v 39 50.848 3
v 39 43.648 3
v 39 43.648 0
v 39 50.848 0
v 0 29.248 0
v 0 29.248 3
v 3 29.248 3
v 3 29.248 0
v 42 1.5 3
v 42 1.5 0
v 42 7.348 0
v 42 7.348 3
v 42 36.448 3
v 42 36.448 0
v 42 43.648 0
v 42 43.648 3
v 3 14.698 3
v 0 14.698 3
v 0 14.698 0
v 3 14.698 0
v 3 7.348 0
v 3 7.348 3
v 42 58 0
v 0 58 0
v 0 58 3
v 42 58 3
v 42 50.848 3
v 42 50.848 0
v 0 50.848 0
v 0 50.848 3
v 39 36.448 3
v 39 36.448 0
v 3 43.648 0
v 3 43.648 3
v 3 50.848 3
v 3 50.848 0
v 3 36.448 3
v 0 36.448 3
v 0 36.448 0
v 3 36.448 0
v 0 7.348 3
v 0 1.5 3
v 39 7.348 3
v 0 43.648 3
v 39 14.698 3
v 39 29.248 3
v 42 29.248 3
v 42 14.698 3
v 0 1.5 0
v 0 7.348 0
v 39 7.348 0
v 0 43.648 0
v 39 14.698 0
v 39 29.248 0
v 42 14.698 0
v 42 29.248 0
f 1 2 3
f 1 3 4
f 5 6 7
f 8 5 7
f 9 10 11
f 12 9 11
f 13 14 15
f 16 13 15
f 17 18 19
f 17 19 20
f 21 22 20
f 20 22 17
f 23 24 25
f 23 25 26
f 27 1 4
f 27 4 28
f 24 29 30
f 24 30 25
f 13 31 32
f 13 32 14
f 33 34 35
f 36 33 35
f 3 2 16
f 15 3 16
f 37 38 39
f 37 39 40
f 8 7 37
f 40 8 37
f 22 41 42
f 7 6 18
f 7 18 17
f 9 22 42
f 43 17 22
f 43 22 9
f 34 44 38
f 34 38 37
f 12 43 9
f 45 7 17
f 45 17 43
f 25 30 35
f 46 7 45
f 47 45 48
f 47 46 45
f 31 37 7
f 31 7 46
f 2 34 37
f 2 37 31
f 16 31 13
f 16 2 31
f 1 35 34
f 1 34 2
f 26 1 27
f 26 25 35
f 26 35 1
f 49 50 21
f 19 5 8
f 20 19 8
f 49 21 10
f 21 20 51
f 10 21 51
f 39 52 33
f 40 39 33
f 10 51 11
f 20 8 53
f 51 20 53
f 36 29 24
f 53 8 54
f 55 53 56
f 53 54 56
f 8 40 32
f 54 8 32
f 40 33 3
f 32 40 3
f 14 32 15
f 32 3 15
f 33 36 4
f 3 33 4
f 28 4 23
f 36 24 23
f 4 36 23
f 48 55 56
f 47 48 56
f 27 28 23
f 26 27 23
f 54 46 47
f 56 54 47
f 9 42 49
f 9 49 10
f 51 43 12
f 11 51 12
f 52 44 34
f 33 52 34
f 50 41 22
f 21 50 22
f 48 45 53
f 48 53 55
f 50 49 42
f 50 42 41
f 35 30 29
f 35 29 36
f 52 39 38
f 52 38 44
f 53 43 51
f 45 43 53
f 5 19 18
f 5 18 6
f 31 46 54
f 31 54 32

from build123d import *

# Parameters (mm, degrees)
SKETCH1_W           = 42
SKETCH1_H           = 58
BOSS_EXTRUDE1_DEPTH = 3
SKETCH2_W           = 3
SKETCH2_H           = 7.199999996
SKETCH2_H_2         = 7.35
CUT_EXTRUDE1_DEPTH  = 3
SKETCH3_W           = 42
SKETCH3_H           = 1.5
CUT_EXTRUDE2_DEPTH  = 4


with BuildPart() as part:
    # Sketch1 → Boss-Extrude1 (new body)
    with BuildSketch(Plane.XY):
        with Locations((21, 29)):
            Rectangle(SKETCH1_W, SKETCH1_H)
    extrude(amount=BOSS_EXTRUDE1_DEPTH)

    # Sketch2 → Cut-Extrude1 (cut)
    with BuildSketch(Plane.XY.offset(3)):
        with Locations((40.5, 47.24818585)):
            Rectangle(SKETCH2_W, SKETCH2_H)
        with Locations((40.5, 32.848185857)):
            Rectangle(SKETCH2_W, SKETCH2_H)
        with Locations((1.5, 47.24818585)):
            Rectangle(SKETCH2_W, SKETCH2_H)
        with Locations((1.5, 32.848185857)):
            Rectangle(SKETCH2_W, SKETCH2_H)
        with Locations((1.5, 11.023185866)):
            Rectangle(SKETCH2_W, SKETCH2_H_2)
        with Locations((40.5, 11.023185866)):
            Rectangle(SKETCH2_W, SKETCH2_H_2)
    extrude(amount=-CUT_EXTRUDE1_DEPTH, mode=Mode.SUBTRACT)

    # Sketch3 → Cut-Extrude2 (cut, through all)
    with BuildSketch(Plane.XY.offset(3)):
        with Locations((21, 0.75)):
            Rectangle(SKETCH3_W, SKETCH3_H)
    extrude(amount=-CUT_EXTRUDE2_DEPTH, mode=Mode.SUBTRACT)


solid = part.part
